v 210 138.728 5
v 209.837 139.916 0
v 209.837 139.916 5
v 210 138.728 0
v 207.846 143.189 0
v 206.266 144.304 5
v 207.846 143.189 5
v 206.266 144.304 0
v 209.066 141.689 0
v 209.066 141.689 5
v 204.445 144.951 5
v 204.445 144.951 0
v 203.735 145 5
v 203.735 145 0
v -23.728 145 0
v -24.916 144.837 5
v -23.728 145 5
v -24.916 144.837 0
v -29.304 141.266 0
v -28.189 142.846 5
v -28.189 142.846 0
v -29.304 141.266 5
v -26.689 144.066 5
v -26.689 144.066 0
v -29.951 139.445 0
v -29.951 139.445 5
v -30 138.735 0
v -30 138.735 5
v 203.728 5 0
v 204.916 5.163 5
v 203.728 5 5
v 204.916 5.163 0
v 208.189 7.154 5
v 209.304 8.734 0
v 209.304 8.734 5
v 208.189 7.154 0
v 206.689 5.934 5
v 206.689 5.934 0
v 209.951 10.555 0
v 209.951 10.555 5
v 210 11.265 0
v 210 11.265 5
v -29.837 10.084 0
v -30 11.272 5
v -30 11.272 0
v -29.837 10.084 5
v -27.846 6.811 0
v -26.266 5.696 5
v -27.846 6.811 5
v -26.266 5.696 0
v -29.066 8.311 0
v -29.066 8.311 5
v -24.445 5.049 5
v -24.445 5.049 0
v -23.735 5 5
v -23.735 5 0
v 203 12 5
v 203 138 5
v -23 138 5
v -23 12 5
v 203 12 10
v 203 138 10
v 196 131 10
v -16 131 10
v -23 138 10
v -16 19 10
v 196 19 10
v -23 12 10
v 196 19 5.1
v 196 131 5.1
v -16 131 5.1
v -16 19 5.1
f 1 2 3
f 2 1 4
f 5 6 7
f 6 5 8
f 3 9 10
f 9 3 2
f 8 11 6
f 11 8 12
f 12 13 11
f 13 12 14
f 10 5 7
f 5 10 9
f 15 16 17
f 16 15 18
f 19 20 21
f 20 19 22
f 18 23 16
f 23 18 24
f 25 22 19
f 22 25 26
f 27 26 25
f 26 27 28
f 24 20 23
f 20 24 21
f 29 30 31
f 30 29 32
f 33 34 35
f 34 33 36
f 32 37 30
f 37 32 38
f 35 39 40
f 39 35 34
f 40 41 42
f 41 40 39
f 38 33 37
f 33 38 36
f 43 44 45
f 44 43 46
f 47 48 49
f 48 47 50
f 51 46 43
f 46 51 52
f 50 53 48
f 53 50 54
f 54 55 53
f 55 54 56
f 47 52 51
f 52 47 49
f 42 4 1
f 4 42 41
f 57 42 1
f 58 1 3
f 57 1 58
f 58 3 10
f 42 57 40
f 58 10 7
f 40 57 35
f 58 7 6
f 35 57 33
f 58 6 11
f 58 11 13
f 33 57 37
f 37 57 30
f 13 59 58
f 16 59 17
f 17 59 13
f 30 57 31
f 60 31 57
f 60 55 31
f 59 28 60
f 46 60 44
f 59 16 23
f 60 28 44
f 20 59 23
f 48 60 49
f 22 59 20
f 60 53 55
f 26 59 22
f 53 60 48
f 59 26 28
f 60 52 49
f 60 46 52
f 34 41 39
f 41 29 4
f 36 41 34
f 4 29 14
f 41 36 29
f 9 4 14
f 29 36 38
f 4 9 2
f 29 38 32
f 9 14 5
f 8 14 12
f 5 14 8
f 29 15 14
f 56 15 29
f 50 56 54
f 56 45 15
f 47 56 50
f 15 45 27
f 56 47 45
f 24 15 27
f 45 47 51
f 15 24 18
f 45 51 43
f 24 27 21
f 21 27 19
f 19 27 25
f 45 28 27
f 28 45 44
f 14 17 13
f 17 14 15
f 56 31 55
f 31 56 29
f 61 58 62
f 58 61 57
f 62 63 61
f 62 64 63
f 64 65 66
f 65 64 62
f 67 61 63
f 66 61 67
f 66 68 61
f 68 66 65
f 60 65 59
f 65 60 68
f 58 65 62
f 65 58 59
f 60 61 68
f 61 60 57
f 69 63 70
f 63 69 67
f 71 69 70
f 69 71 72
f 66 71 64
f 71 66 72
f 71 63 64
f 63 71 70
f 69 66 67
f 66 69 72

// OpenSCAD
// Datacrypt

module prism(l, w, h){
polyhedron(//pt 0        1        2        3        4        5
      points=[[0,0,0], [l,0,0], [l,w,0], [0,w,0], [0,w,h], [l,w,h]],
      faces=[[0,1,2,3],[5,4,3,2],[0,4,5,1],[0,3,4],[5,2,1]]
      );
}

module roundout(w,h)
{
    difference()
    {
        cube([w,w,h]);
        translate([0,0, -0.1]) cylinder(h + 0.2, r = w, $fa = 4);
    }
}

module mobo() {
    W = 177.8;
    H = 116.7;
    MOUNT_INSET = 6.190;
    DISPLAY_X = 20.320;
    DISPLAY_Y = 22.225;
    DISPLAY_PITCH_X = 40.640;
    DISPLAY_W = 22.860;
    DISPLAY_H = 13.716;
    DISPLAY_Z = 13.7;
    for(i = [0:3])
    {
        translate([(i * DISPLAY_PITCH_X) + DISPLAY_X, DISPLAY_Y, 2])
        cube([DISPLAY_W, DISPLAY_H, DISPLAY_Z]);
    }
    
    SUB_DISPLAY_X = 20.955;
    SUB_DISPLAY_Y = 55.880;
    SUB_DISPLAY_PITCH_X = 40.640;
    SUB_DISPLAY_W = 22.479;
    SUB_DISPLAY_H = 5.461;
    SUB_DISPLAY_Z = 13.7;
    for(i = [0:3])
    {
        translate([(i * SUB_DISPLAY_PITCH_X) + SUB_DISPLAY_X, SUB_DISPLAY_Y, 2])
        cube([SUB_DISPLAY_W, SUB_DISPLAY_H, SUB_DISPLAY_Z]);
    }
    LED_W = 5.080;
    LED_H = 5.080;
    LED_DISP_X = 30.480;
    LED_DISP_Y = 45.720;
    LED_DISP_PITCH_X = 40.640;
    LED_Z = 13.7;
    for(i = [0:3])
    {
        translate([(i * LED_DISP_PITCH_X) + LED_DISP_X,LED_DISP_Y,2])
        cube([LED_W, LED_H, LED_Z]);
    }
    
    COUNTERS_X = 68.2;
    COUNTERS_1_Y = 71.247;
    COUNTERS_2_Y = 81.534;
    TIMER_Y = 96.774;
    COUNTER_PITCH_X = 15.24;
    TIMER_PITCH_X = 10.160;
    for(i = [0:3])
    {
        translate([(i * COUNTER_PITCH_X) + COUNTERS_X, COUNTERS_1_Y, 2])
        cube([LED_W, LED_H, LED_Z]);
    }
    for(i = [0:3])
    {
        translate([(i * COUNTER_PITCH_X) + COUNTERS_X, COUNTERS_2_Y, 2])
        cube([LED_W, LED_H, LED_Z]);
    }
    for(i = [0:5])
    {
        translate([(i * TIMER_PITCH_X) + COUNTERS_X - TIMER_PITCH_X/2, TIMER_Y, 2])
        cube([LED_W, LED_H, LED_Z]);
    }
    for(x = [MOUNT_INSET, MOUNT_INSET + 165.669])
        for(y = [MOUNT_INSET, MOUNT_INSET + 104.811])
            translate([x, y, - 3.5])
            cylinder(h = 3.6, r = 2.75);
    cube([W,H,2]);
}

module base_lower(m)
{
    MARGIN = m;
    BASE_W = 177.8;
    BASE_H = 116.7;
    CASE_W = 177.8 + (2 * MARGIN);
    CASE_H = 116.7 + (2 * MARGIN);
    MOUNT_INSET = 6.190;
    difference()
    {
        translate([-MARGIN, -MARGIN]) cube([CASE_W, CASE_H, 5]);
        translate([CASE_W-(2 * MARGIN), CASE_H-(2 * MARGIN), -0.1]) roundout(MARGIN + 0.1,5.2);
        translate([0, CASE_H-(2 * MARGIN), -0.1]) rotate([0,0,90]) roundout(MARGIN + 0.1,5.2);
        translate([CASE_W-(2 * MARGIN), 0, -0.1]) rotate([0,0,-90]) roundout(MARGIN + 0.1,5.2);
        translate([0, 0, -0.1]) rotate([0,0,180]) roundout(MARGIN + 0.1,5.2);
        translate([BASE_W+MARGIN/2.5, BASE_H+MARGIN/2.5, 2]) m3_well(10);
        translate([-MARGIN/2.5, BASE_H+MARGIN/2.5, 2]) m3_well(10);
        translate([BASE_W+MARGIN/2.5, -MARGIN/2.5, 2]) m3_well(10);
        translate([-MARGIN/2.5, -MARGIN/2.5, 2]) m3_well(10);
    }
}

module base_upper(m)
{
    MARGIN = m;
    BASE_W = 177.8;
    BASE_H = 116.7;
    CUTOUT = 75;
    CASE_W = BASE_W + (2 * MARGIN);
    CASE_H = BASE_H + (2 * MARGIN);
    difference()
    {
        translate([-MARGIN, -MARGIN, 5]) cube([CASE_W, CASE_H, 12]);
        translate([0,0,4]) cube([BASE_W, BASE_H, 11]);
        translate([0,0,4]) lower_bezel();
        translate([-MARGIN, -MARGIN]) cube([CASE_W, CASE_H, 5]);
        translate([CASE_W-(2 * MARGIN), CASE_H-(2 * MARGIN), -0.1]) roundout(MARGIN + 0.1,17.2);
        translate([0, CASE_H-(2 * MARGIN), -0.1]) rotate([0,0,90]) roundout(MARGIN + 0.1,17.2);
        translate([CASE_W-(2 * MARGIN), 0, -0.1]) rotate([0,0,-90]) roundout(MARGIN + 0.1,17.2);
        translate([0, 0, -0.1]) rotate([0,0,180]) roundout(MARGIN + 0.1,17.2);
        translate([BASE_W+MARGIN/2.5, BASE_H+MARGIN/2.5, 0]) m3_well(10);
        translate([-MARGIN/2.5, BASE_H+MARGIN/2.5, 0]) m3_well(10);
        translate([BASE_W+MARGIN/2.5, -MARGIN/2.5, 0]) m3_well(10);
        translate([-MARGIN/2.5, -MARGIN/2.5, 0]) m3_well(10);
        translate([(BASE_W / 2) - (CUTOUT / 2), BASE_H-5, 0]) cube([CUTOUT, 30, 10]);
    }
    
    translate([(BASE_W / 2) - CUTOUT, BASE_H+20, 5]) {
        difference()
        {
            union()
            {
                cube([10,5,12]);
                translate([0, 5, 6.03]) rotate([0,90,0]) cylinder(h=10, r=6.03);
            }
            translate([-0.1, 5, 6.03]) rotate([0,90, 0]) cylinder(h=10.2, r=3.6);
        }
    }
    
    translate([(BASE_W / 2) + CUTOUT, BASE_H+20, 5]) {
        difference()
        {
            union()
            {
                cube([10,5,12]);
                translate([0, 5, 6.03]) rotate([0,90,0]) cylinder(h=10, r=6.03);
            }
            translate([-0.1, 5, 6.03]) rotate([0,90, 0]) cylinder(h=10.2, r=3.6);
        }
    }
        
}

module lower_base()
{
    MARGIN = 20;
    difference()
    {
        base_lower(MARGIN);
        translate([0,0,4]) mobo();
    }
}


module lower_bezel()
{
    MARGIN = 4;
    CASE_W = 177.8 + (2 * MARGIN);
    CASE_H = 116.7 + (2 * MARGIN);
    BEZEL_W = 2;
    difference()
    {
        translate([-MARGIN, -MARGIN]) cube([CASE_W, CASE_H, 8]);
        translate([0,0,4]) mobo();
        translate([-MARGIN+BEZEL_W, -MARGIN+BEZEL_W, -0.5]) cube([CASE_W-(BEZEL_W * 2),CASE_H-(BEZEL_W * 2), 9]);
    }
}

module upper_base()
{
    MARGIN = 20;
    difference()
    {
        base_upper(MARGIN);
        translate([0,0,4]) mobo();
    }
}

module m3_well(h)
{
    INF_PUNCH = 999;
    cylinder(h = h, r = 1.7, $fn = 20); 
    translate([0,0,h]) cylinder(h = INF_PUNCH, r = 3, $fn = 20);
    translate([0,0,-INF_PUNCH]) linear_extrude(height=INF_PUNCH) scale([3.05, 3.05, 0]) polygon([[1, 0], [0.5, 0.86603], [-0.5, 0.86603], [-1, 0], [-0.5, -0.86603], [0.5, -0.86603]]);
}

module toggle()
{
    // 12 mm hole
    // 36mm? depth
    cylinder(h = 36, r = 12 / 2);
}

module power_switch()
{
    // 19 x 13 mm
    cube([19, 13, 35]);
}

module sub_button()
{
    // 16mm button
    // Internal depth of 24mm?
    cylinder(h = 36, r = 16 / 2);
}

module switches()
{
    translate([5,0,10])
    {
        // Lock row
        translate([0, 45, 0])
        {
           for(x = [0:3])
            translate([x * 35, 0, 0])
           toggle();       
        }
        
        translate([140,50, 0])
        {
            for (x =[0:1])
                translate([x * 35, 0, 0])
            toggle();
        }
        
        translate([70,110,0])
        for(x = [0:3])
            translate([x * 30, 0 ,0])
            sub_button();
        translate([0, 95, 0])
        for(x = [0:1])
            for(y = [0:1])
                translate([x * 30, y * 30, 0])
            sub_button();
            
        translate([190,115,0]) rotate([90,0,0]) power_switch();
        translate([45,0,20]) cube([80,20,10]);
    }
}

module switchboard_top()
{
    W = 240;
    L = 140;
    H = 45;
    MARGIN = 7;
    difference()
    {
    union()
    {
        translate([-30,5,0])
        {
            difference()
            {            
                cube([W,L,H]);
                translate([MARGIN, MARGIN, 0])
                {
                    translate([W-(2 * MARGIN), L-(2 * MARGIN), -0.1]) roundout(MARGIN + 0.1,H + 0.2);
                    translate([0, L-(2 * MARGIN), -0.1]) rotate([0,0,90]) roundout(MARGIN + 0.1,H + 0.2);
                    translate([W-(2 * MARGIN), 0, -0.1]) rotate([0,0,-90]) roundout(MARGIN + 0.1,H + 0.2);
                    translate([0, 0, -0.1]) rotate([0,0,180]) roundout(MARGIN + 0.1,H + 0.2);
                    translate([0,0,-0.1]) cube([W-(2 * MARGIN), L - (2 * MARGIN), H-4]);
                }
            }
        }   
    }
    switches();
    }
}

module switchboard_bottom()
{
    W = 240;
    L = 140;
    H = 5;
    MARGIN = 7;
    translate([-30,5,0])
    {
        difference()
        {            
            cube([W,L,H]);
            translate([MARGIN, MARGIN, 0])
            {
                translate([W-(2 * MARGIN), L-(2 * MARGIN), -0.1]) roundout(MARGIN + 0.1,H + 0.2);
                translate([0, L-(2 * MARGIN), -0.1]) rotate([0,0,90]) roundout(MARGIN + 0.1,H + 0.2);
                translate([W-(2 * MARGIN), 0, -0.1]) rotate([0,0,-90]) roundout(MARGIN + 0.1,H + 0.2);
                translate([0, 0, -0.1]) rotate([0,0,180]) roundout(MARGIN + 0.1,H + 0.2);
            }
        }
            translate([MARGIN,MARGIN,H])
            {
                
        difference()
        {
                cube([W - (2 * MARGIN), L - (2 * MARGIN), H]);
                translate([MARGIN,MARGIN,0.1]) cube([W - (4 * MARGIN), L - (4 * MARGIN), H]);
            }
        }
    }   
}

module lower_part()
{
    union()
    {
        lower_base();
        lower_bezel();
    }
}

// Top part
//rotate([0,180,0]) upper_base();
//lower_part();

// Bottom part
//rotate([0,180,0]) switchboard_top();
switchboard_bottom();
